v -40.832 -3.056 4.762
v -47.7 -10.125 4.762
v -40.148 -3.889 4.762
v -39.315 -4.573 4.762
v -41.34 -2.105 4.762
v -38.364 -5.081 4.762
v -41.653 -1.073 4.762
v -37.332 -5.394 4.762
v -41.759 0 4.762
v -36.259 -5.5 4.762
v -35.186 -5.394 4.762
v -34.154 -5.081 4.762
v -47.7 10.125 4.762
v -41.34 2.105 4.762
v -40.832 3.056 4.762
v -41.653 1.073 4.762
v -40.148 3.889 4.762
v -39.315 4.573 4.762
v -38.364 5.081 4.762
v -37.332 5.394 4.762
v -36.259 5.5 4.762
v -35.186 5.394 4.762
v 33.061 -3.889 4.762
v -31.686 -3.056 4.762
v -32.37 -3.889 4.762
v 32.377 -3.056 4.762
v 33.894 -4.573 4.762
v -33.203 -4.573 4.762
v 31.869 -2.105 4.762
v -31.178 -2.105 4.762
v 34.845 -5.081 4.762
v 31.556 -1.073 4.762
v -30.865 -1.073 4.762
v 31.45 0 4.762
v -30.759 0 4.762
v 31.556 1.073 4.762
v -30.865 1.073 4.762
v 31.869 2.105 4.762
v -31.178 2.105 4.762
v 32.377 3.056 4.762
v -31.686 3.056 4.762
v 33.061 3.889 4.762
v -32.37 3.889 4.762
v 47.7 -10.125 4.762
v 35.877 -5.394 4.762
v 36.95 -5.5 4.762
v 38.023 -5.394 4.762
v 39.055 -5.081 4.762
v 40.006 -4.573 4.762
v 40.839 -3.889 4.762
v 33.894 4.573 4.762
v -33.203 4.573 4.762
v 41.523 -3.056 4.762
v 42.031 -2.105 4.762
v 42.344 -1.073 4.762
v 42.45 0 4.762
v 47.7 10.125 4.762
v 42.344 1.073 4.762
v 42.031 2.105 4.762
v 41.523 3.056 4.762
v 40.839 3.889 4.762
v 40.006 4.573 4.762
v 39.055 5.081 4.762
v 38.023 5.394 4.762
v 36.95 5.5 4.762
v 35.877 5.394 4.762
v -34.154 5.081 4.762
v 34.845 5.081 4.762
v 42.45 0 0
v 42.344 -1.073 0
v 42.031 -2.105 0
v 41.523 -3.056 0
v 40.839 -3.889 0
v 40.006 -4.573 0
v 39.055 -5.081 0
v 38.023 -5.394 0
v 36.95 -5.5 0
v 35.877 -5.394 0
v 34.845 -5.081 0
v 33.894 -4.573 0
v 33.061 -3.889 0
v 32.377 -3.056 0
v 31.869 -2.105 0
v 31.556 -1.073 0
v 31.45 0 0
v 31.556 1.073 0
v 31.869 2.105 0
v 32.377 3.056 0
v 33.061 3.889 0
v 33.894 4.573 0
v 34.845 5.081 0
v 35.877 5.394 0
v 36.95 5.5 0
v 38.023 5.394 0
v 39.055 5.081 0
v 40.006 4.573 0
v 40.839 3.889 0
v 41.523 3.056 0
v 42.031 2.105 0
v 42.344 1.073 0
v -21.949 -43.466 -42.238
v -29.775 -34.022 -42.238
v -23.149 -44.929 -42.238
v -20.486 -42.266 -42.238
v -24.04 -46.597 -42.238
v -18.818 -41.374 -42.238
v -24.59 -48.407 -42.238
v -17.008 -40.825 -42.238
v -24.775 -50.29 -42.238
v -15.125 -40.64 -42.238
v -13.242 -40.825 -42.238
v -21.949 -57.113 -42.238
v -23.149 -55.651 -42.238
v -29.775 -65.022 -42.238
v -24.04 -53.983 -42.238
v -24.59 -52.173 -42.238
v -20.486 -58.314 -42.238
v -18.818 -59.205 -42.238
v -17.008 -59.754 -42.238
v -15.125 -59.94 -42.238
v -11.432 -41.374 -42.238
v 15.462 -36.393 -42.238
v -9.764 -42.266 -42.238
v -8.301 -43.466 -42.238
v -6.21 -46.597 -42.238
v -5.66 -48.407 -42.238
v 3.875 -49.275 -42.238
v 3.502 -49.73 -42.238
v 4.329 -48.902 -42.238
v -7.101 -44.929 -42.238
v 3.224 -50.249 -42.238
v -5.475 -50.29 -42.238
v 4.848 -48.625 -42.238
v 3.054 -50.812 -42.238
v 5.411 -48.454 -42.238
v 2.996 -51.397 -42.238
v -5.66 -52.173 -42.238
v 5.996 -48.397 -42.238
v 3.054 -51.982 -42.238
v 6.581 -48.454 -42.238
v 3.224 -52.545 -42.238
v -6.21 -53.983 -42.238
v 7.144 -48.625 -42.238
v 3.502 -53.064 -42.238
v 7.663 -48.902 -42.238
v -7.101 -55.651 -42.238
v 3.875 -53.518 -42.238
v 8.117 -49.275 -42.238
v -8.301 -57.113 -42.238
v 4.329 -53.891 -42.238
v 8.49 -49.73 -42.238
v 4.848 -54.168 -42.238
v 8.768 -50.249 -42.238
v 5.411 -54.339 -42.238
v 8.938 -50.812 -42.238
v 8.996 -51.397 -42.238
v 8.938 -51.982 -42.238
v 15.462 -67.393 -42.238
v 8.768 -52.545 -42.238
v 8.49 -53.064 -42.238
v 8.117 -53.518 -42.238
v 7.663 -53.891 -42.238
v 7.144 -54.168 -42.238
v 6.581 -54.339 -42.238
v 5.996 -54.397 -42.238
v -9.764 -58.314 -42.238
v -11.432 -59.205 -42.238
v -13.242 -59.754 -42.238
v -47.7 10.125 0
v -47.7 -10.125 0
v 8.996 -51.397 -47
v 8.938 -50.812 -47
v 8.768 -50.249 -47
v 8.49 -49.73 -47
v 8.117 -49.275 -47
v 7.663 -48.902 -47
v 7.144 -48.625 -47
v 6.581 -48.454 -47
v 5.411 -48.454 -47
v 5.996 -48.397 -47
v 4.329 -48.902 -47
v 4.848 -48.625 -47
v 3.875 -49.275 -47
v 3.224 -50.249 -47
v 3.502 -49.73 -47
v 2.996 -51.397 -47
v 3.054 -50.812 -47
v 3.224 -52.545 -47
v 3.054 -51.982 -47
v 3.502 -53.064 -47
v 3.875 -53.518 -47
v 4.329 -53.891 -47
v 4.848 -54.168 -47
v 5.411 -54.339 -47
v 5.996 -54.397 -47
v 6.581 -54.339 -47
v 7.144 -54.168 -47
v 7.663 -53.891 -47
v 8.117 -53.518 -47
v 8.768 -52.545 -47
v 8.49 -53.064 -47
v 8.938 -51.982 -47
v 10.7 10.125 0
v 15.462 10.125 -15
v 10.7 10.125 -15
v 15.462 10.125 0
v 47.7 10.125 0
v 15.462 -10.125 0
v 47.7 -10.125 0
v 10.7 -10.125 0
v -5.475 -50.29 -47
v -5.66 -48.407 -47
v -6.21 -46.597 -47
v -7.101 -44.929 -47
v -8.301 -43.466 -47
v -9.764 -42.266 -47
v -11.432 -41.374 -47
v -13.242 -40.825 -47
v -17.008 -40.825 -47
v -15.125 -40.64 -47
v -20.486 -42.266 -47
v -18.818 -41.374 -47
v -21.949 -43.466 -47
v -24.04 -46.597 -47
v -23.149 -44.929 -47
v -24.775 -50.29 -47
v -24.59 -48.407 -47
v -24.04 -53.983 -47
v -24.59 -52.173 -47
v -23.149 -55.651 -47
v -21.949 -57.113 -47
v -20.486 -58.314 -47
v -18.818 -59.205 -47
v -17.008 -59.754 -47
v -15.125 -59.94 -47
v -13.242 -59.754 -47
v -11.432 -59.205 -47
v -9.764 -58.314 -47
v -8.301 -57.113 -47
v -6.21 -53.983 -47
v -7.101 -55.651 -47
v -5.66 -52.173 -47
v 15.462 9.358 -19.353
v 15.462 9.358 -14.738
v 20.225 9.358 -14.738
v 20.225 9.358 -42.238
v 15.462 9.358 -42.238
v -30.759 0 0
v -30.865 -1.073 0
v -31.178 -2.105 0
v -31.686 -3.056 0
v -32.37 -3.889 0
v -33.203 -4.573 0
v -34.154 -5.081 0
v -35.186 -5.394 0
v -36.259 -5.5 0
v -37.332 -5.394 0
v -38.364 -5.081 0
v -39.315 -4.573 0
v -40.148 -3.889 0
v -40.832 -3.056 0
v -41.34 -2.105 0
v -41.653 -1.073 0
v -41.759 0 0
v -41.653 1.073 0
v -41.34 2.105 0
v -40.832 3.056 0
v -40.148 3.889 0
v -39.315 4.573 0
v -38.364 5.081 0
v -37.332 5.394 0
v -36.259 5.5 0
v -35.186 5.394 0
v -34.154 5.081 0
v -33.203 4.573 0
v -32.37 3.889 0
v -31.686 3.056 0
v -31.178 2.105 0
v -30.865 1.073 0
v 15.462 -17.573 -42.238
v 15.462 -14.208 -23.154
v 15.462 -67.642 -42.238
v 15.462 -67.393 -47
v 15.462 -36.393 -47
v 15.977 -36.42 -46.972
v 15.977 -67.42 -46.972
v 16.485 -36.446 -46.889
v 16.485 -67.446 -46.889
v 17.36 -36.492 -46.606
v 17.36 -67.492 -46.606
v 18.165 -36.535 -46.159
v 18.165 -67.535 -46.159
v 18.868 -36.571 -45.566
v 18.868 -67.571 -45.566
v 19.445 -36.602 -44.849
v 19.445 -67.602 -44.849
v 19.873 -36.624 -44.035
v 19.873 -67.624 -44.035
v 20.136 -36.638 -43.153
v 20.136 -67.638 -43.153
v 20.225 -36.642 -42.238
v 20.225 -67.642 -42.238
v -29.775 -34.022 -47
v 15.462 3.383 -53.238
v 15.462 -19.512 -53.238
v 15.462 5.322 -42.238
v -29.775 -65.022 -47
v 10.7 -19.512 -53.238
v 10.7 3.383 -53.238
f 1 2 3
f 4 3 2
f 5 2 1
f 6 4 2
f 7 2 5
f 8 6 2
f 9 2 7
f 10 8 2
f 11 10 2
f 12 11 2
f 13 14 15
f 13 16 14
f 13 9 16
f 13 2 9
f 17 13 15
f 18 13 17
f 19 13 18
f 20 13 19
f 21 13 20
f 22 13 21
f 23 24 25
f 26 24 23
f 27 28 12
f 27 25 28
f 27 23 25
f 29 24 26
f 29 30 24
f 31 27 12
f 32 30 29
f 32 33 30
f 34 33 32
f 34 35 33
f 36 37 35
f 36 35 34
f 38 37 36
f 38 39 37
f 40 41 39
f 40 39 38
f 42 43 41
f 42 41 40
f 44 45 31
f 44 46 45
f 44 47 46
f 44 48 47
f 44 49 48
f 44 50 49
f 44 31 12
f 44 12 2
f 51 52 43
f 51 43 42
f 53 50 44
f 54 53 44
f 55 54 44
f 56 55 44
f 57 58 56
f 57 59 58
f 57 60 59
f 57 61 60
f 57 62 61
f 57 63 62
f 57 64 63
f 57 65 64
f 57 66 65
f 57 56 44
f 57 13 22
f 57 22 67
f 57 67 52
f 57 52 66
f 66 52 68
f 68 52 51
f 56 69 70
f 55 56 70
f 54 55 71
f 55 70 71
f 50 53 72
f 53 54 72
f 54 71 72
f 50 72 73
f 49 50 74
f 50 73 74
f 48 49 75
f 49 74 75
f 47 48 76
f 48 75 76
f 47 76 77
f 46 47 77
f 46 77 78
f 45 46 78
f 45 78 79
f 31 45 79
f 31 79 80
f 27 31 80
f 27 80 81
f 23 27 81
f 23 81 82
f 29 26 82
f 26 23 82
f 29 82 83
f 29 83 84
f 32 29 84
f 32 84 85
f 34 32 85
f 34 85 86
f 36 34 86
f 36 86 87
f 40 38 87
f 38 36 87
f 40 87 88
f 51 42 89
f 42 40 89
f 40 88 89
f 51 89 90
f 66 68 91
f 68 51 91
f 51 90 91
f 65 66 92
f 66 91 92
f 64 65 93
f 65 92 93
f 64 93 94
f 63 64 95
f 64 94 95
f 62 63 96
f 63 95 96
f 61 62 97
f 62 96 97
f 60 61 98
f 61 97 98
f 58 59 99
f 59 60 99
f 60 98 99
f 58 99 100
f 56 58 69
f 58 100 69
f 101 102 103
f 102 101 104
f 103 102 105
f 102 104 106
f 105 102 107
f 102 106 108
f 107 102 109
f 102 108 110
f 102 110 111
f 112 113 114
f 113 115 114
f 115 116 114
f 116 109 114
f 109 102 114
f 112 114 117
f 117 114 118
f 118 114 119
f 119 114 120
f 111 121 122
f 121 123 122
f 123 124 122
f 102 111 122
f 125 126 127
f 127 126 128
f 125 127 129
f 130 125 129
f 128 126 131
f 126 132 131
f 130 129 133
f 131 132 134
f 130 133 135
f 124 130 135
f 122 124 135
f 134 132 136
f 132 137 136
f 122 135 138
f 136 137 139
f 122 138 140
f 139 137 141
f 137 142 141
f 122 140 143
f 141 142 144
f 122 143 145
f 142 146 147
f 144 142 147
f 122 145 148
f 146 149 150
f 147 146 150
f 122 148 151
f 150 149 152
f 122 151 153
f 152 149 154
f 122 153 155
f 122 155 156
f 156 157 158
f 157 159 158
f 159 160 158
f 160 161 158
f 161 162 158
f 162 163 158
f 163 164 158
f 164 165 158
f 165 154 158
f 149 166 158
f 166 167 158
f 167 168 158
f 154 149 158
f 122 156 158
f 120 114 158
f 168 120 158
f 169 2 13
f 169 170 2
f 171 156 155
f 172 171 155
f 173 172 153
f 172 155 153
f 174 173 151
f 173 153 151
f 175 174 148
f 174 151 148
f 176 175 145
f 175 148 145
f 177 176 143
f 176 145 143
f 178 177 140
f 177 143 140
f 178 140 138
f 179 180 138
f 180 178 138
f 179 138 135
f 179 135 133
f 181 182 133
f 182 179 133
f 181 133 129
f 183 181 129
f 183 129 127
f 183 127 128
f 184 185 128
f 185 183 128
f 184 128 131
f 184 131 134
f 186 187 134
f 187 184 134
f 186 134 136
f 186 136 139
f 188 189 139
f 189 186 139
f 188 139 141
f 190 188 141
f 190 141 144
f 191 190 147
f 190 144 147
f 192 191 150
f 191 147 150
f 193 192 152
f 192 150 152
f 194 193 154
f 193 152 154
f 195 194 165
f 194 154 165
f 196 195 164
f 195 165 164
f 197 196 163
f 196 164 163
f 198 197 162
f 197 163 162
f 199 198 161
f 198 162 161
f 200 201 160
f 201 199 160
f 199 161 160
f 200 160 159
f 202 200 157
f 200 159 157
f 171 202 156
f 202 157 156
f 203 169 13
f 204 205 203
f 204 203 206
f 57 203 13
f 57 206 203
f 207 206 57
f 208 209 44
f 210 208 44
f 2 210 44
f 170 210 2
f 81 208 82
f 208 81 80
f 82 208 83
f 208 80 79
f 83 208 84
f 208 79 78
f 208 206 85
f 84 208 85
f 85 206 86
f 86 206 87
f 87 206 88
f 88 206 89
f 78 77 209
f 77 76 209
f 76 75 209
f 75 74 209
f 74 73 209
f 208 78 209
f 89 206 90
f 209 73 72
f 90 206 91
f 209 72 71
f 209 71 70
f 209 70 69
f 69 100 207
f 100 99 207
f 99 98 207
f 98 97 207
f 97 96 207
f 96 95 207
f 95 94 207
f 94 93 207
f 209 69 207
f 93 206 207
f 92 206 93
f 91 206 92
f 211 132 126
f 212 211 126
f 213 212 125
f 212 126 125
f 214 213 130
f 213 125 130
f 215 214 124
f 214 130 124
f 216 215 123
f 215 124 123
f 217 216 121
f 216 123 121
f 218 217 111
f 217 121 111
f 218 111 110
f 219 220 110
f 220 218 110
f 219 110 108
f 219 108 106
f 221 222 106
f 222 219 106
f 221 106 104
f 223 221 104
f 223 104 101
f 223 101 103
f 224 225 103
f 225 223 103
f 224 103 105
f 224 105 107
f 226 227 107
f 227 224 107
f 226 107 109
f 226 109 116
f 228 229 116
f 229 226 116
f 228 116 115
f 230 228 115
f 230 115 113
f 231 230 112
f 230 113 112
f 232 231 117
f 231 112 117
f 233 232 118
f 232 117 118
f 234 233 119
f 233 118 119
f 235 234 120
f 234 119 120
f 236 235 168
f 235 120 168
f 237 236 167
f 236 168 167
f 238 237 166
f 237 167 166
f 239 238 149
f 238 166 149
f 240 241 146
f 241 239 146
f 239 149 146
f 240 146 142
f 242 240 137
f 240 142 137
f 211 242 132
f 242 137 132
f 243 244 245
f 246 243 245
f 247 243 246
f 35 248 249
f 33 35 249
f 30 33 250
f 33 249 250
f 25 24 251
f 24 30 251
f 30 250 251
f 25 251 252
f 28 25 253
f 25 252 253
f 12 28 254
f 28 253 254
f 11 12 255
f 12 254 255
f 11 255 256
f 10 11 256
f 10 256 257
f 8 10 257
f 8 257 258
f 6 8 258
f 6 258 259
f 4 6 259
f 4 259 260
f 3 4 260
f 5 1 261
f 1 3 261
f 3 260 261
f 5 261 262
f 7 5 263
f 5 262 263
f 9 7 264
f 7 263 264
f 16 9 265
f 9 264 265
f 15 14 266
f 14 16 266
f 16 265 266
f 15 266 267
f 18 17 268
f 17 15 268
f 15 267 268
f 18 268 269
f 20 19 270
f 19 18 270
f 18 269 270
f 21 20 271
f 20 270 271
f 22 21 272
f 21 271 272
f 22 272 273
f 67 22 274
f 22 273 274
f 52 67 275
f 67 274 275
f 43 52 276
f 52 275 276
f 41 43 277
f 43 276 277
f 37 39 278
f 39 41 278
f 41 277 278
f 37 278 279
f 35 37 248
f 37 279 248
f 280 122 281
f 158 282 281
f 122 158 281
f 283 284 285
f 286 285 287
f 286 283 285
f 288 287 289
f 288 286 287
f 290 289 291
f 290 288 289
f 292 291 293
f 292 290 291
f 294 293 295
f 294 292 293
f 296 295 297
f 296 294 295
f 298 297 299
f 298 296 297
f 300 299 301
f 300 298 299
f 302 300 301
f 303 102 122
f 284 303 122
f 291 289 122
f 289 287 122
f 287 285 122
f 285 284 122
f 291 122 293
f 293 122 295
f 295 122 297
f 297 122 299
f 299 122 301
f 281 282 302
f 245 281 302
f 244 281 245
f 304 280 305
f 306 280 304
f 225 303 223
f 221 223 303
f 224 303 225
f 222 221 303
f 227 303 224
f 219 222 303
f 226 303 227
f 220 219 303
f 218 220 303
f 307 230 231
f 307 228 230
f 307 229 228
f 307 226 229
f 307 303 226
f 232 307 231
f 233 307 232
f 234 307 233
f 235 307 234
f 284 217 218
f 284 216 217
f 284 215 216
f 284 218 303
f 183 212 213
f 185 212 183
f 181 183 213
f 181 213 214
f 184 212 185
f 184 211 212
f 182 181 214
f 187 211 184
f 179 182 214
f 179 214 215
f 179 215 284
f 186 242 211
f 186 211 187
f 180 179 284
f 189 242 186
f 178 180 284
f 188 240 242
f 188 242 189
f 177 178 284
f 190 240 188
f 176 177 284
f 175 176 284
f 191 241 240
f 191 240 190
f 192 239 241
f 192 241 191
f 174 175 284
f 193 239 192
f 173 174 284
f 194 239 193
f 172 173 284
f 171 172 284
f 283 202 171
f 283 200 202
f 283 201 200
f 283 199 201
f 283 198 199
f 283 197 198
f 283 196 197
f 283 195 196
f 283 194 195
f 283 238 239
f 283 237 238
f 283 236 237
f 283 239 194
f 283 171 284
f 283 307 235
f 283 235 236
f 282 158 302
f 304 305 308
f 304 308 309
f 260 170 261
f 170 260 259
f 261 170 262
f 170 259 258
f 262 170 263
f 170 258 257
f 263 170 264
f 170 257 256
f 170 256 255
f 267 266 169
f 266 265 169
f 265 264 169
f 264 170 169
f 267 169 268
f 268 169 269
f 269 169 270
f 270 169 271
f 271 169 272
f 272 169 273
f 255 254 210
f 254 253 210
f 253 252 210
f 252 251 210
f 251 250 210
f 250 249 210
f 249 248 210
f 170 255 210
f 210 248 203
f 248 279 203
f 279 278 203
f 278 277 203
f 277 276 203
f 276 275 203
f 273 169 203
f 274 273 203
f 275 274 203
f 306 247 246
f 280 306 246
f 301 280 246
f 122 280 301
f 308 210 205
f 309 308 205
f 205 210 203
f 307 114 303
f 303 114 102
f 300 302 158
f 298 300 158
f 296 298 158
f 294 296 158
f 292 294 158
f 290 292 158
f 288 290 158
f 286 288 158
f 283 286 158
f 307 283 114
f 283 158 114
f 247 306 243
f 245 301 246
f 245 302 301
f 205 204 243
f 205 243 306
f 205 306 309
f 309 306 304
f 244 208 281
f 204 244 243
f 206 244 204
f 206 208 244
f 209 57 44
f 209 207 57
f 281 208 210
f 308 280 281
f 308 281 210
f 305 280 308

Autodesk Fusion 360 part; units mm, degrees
sketch "Sketch4" plane through (0, 0, 0) normal (0, 0, 1) x (1, 0, 0)
  line L0 (-47.7, 10.125) -> (47.7, 10.125)
  line L1 (47.7, 10.125) -> (47.7, -10.125)
  line L2 (47.7, -10.125) -> (-47.7, -10.125)
  line L3 (-47.7, -10.125) -> (-47.7, 10.125)
  line L4 (-47.7, 0) -> (47.7, 0) construction
  circle A0 centre (36.95, 0) radius 5.5
  line L5 (0.3455, 47) -> (0.3455, -29) construction
  circle A1 centre (-36.2591, 0) radius 5.5
  line L6 (42.45, 3.7083) -> (42.45, -3.7083) construction
  point P0 (47.7, 0)
  point P1 (-47.7, 0)
  point P2 (42.45, 0)
  dimension "d16" = 95.4
  dimension "d17" = 20.25
  dimension "d18" = 11
  dimension "d20" = 5.25
extrude "Extrude2" add sketch "Sketch4" along normal blind 4.7625
sketch "Sketch5" plane through (0, 0, 0) normal (0, 0, -1) x (1, 0, 0)
  circle A0 centre (36.95, 0) radius 5.5
  circle A1 centre (-36.2591, 0) radius 5.5
  line L0 (47.7, 10.125) -> (-47.7, 10.125)
  line L1 (-47.7, 10.125) -> (-47.7, -10.125)
  line L2 (-47.7, -10.125) -> (47.7, -10.125)
  line L3 (47.7, -10.125) -> (47.7, 10.125)
  line L4 (10.7, 15.5999) -> (15.4625, 15.5999)
  line L5 (15.4625, 15.5999) -> (15.4625, -14.8215)
  line L6 (10.7, -14.8215) -> (10.7, 15.5999)
  line L7 (10.7, -14.8215) -> (15.4625, -14.8215)
  dimension "d24" = 37
  dimension "d25" = 4.7625
extrude "Extrude3" add sketch "Sketch5" along normal blind 53.2375 contours L0 L2 L5 L6 | L0 L4 L5 L6 | L2 L5 L6 L7
sketch "Sketch6" plane through (15.4625, 0, 0) normal (1, 0, 0) x (0, 1, 0)
  line L0 (-10.125, 0) -> (-15.5999, 0)
  line L1 (-15.5999, 0) -> (-15.5999, -53.2375)
  line L2 (-15.5999, -53.2375) -> (14.8215, -53.2375)
  line L3 (14.8215, -53.2375) -> (14.8215, 0)
  line L4 (14.8215, 0) -> (10.125, 0)
  line L5 (10.125, 0) -> (-10.125, 0)
  line L6 (-10.125, 0) -> (10.125, 0)
  line L7 (10.125, 0) -> (10.125, -15)
  line L8 (-10.125, 0) -> (-19.5122, -53.2375)
  line L9 (10.125, -15) -> (3.3827, -53.2375)
  line L10 (-19.5122, -53.2375) -> (3.3827, -53.2375)
  point P0 (10.125, 0)
  dimension "d30" = 100
extrude "Extrude4" cut sketch "Sketch6" against normal up to surface (4.7625 mm away) contours L0 L1 L8 | L2 L3 L4 L7 L9
extrude "Extrude5" add sketch "Sketch6" against normal up to surface (4.7625 mm away) contours L1 L8 L10
sketch "Sketch7" plane through (15.4625, 0, 0) normal (1, 0, 0) x (0, 1, 0)
  line L0 (3.3827, -53.2375) -> (10.125, -15)
  line L1 (10.125, -15) -> (10.125, 0)
  line L2 (10.125, 0) -> (-10.125, 0)
  line L3 (-10.125, 0) -> (-19.5122, -53.2375)
  line L4 (-19.5122, -53.2375) -> (3.3827, -53.2375)
  line L5 (-67.6425, -42.2375) -> (9.3575, -14.7375)
  line L6 (9.3575, -14.7375) -> (9.3575, -42.2375)
  line L7 (9.3575, -42.2375) -> (-67.6425, -42.2375)
  line L8 (-10.125, 4.7625) -> (10.125, 4.7625)
  dimension "d35" = 77
  dimension "d36" = 27.5
  dimension "d37" = 47
extrude "Extrude6" add sketch "Sketch7" along normal blind 4.7625 contours L0 L3 L5 L6 L7 | L0 L6 L7 | L3 L5 L7
sketch "Sketch8" plane through (0, 0, -42.2375) normal (0, 0, -1) x (1, 0, 0)
  line L0 (15.4625, -5.3223) -> (15.4625, -9.3575)
  line L1 (15.4625, -9.3575) -> (20.225, -9.3575)
  line L2 (20.225, -9.3575) -> (20.225, 67.6425)
  line L3 (20.225, 67.6425) -> (15.4625, 67.6425)
  line L4 (15.4625, 67.6425) -> (15.4625, 17.5726)
  line L5 (15.4625, 17.5726) -> (15.4625, -5.3223)
  line L6 (20.225, 67.6425) -> (-29.775, 65.0221)
  line L7 (-29.775, 65.0221) -> (-29.775, 34.0221)
  line L8 (-29.775, 34.0221) -> (20.225, 36.6425)
  line L9 (20.225, 36.6425) -> (20.225, 67.6425)
  circle A0 centre (-15.125, 50.2899) radius 9.65
  line L10 (-15.125, 40.6399) -> (-15.125, 59.9399) construction
  line L11 (-5.475, 50.2899) -> (-24.775, 50.2899) construction
  line L12 (-24.775, 58.5104) -> (-24.775, 42.0694) construction
  line L13 (-15.1316, 59.9399) -> (-15.1184, 59.9399) construction
  line L14 (-15.1316, 40.6399) -> (-15.1184, 40.6399) construction
  line L15 (-15.9351, 65.7475) -> (-14.3149, 34.8324) construction
  line L16 (15.4625, 51.8929) -> (-29.775, 49.5221) construction
  circle A1 centre (5.996, 51.3968) radius 3
  line L17 (-5.6407, 53.7042) -> (-5.3358, 47.8857) construction
  line L18 (2.8046, 54.9702) -> (3.1956, 47.5094) construction
  point P0 (-15.125, 50.2899)
  point P1 (-5.4882, 50.795)
  point P2 (3.0001, 51.2398)
  dimension "d40" = 3
  dimension "d41" = 50
  dimension "d42" = 31
  dimension "d44" = 19.3
  dimension "d45" = 5
  dimension "d47" = 30.9575
  dimension "d49" = 6
  dimension "d50" = 8.5
extrude "Extrude7" add sketch "Sketch8" along normal blind 4.7625 contours L4 L6 L7 L8 | L2 L4 L6 L8 L9
fillet "Fillet1" radius 4.7625 1 edges at (20.225, -52.1425, -47)
equation "d21 = ( 3 / 16 ) * 1 in"
equation "d25 = ( 3 / 16 ) * 1 in"
equation "d26 = 58 mm - ( ( 3 / 16 ) * 1 in )"
equation "d30 = 90 deg + 10 deg"
equation "d38 = ( 3 / 16 ) * 1 in"
equation "d51 = ( 3 / 16 ) * 1 in"
equation "d54 = ( 3 / 16 ) * 1 in"
